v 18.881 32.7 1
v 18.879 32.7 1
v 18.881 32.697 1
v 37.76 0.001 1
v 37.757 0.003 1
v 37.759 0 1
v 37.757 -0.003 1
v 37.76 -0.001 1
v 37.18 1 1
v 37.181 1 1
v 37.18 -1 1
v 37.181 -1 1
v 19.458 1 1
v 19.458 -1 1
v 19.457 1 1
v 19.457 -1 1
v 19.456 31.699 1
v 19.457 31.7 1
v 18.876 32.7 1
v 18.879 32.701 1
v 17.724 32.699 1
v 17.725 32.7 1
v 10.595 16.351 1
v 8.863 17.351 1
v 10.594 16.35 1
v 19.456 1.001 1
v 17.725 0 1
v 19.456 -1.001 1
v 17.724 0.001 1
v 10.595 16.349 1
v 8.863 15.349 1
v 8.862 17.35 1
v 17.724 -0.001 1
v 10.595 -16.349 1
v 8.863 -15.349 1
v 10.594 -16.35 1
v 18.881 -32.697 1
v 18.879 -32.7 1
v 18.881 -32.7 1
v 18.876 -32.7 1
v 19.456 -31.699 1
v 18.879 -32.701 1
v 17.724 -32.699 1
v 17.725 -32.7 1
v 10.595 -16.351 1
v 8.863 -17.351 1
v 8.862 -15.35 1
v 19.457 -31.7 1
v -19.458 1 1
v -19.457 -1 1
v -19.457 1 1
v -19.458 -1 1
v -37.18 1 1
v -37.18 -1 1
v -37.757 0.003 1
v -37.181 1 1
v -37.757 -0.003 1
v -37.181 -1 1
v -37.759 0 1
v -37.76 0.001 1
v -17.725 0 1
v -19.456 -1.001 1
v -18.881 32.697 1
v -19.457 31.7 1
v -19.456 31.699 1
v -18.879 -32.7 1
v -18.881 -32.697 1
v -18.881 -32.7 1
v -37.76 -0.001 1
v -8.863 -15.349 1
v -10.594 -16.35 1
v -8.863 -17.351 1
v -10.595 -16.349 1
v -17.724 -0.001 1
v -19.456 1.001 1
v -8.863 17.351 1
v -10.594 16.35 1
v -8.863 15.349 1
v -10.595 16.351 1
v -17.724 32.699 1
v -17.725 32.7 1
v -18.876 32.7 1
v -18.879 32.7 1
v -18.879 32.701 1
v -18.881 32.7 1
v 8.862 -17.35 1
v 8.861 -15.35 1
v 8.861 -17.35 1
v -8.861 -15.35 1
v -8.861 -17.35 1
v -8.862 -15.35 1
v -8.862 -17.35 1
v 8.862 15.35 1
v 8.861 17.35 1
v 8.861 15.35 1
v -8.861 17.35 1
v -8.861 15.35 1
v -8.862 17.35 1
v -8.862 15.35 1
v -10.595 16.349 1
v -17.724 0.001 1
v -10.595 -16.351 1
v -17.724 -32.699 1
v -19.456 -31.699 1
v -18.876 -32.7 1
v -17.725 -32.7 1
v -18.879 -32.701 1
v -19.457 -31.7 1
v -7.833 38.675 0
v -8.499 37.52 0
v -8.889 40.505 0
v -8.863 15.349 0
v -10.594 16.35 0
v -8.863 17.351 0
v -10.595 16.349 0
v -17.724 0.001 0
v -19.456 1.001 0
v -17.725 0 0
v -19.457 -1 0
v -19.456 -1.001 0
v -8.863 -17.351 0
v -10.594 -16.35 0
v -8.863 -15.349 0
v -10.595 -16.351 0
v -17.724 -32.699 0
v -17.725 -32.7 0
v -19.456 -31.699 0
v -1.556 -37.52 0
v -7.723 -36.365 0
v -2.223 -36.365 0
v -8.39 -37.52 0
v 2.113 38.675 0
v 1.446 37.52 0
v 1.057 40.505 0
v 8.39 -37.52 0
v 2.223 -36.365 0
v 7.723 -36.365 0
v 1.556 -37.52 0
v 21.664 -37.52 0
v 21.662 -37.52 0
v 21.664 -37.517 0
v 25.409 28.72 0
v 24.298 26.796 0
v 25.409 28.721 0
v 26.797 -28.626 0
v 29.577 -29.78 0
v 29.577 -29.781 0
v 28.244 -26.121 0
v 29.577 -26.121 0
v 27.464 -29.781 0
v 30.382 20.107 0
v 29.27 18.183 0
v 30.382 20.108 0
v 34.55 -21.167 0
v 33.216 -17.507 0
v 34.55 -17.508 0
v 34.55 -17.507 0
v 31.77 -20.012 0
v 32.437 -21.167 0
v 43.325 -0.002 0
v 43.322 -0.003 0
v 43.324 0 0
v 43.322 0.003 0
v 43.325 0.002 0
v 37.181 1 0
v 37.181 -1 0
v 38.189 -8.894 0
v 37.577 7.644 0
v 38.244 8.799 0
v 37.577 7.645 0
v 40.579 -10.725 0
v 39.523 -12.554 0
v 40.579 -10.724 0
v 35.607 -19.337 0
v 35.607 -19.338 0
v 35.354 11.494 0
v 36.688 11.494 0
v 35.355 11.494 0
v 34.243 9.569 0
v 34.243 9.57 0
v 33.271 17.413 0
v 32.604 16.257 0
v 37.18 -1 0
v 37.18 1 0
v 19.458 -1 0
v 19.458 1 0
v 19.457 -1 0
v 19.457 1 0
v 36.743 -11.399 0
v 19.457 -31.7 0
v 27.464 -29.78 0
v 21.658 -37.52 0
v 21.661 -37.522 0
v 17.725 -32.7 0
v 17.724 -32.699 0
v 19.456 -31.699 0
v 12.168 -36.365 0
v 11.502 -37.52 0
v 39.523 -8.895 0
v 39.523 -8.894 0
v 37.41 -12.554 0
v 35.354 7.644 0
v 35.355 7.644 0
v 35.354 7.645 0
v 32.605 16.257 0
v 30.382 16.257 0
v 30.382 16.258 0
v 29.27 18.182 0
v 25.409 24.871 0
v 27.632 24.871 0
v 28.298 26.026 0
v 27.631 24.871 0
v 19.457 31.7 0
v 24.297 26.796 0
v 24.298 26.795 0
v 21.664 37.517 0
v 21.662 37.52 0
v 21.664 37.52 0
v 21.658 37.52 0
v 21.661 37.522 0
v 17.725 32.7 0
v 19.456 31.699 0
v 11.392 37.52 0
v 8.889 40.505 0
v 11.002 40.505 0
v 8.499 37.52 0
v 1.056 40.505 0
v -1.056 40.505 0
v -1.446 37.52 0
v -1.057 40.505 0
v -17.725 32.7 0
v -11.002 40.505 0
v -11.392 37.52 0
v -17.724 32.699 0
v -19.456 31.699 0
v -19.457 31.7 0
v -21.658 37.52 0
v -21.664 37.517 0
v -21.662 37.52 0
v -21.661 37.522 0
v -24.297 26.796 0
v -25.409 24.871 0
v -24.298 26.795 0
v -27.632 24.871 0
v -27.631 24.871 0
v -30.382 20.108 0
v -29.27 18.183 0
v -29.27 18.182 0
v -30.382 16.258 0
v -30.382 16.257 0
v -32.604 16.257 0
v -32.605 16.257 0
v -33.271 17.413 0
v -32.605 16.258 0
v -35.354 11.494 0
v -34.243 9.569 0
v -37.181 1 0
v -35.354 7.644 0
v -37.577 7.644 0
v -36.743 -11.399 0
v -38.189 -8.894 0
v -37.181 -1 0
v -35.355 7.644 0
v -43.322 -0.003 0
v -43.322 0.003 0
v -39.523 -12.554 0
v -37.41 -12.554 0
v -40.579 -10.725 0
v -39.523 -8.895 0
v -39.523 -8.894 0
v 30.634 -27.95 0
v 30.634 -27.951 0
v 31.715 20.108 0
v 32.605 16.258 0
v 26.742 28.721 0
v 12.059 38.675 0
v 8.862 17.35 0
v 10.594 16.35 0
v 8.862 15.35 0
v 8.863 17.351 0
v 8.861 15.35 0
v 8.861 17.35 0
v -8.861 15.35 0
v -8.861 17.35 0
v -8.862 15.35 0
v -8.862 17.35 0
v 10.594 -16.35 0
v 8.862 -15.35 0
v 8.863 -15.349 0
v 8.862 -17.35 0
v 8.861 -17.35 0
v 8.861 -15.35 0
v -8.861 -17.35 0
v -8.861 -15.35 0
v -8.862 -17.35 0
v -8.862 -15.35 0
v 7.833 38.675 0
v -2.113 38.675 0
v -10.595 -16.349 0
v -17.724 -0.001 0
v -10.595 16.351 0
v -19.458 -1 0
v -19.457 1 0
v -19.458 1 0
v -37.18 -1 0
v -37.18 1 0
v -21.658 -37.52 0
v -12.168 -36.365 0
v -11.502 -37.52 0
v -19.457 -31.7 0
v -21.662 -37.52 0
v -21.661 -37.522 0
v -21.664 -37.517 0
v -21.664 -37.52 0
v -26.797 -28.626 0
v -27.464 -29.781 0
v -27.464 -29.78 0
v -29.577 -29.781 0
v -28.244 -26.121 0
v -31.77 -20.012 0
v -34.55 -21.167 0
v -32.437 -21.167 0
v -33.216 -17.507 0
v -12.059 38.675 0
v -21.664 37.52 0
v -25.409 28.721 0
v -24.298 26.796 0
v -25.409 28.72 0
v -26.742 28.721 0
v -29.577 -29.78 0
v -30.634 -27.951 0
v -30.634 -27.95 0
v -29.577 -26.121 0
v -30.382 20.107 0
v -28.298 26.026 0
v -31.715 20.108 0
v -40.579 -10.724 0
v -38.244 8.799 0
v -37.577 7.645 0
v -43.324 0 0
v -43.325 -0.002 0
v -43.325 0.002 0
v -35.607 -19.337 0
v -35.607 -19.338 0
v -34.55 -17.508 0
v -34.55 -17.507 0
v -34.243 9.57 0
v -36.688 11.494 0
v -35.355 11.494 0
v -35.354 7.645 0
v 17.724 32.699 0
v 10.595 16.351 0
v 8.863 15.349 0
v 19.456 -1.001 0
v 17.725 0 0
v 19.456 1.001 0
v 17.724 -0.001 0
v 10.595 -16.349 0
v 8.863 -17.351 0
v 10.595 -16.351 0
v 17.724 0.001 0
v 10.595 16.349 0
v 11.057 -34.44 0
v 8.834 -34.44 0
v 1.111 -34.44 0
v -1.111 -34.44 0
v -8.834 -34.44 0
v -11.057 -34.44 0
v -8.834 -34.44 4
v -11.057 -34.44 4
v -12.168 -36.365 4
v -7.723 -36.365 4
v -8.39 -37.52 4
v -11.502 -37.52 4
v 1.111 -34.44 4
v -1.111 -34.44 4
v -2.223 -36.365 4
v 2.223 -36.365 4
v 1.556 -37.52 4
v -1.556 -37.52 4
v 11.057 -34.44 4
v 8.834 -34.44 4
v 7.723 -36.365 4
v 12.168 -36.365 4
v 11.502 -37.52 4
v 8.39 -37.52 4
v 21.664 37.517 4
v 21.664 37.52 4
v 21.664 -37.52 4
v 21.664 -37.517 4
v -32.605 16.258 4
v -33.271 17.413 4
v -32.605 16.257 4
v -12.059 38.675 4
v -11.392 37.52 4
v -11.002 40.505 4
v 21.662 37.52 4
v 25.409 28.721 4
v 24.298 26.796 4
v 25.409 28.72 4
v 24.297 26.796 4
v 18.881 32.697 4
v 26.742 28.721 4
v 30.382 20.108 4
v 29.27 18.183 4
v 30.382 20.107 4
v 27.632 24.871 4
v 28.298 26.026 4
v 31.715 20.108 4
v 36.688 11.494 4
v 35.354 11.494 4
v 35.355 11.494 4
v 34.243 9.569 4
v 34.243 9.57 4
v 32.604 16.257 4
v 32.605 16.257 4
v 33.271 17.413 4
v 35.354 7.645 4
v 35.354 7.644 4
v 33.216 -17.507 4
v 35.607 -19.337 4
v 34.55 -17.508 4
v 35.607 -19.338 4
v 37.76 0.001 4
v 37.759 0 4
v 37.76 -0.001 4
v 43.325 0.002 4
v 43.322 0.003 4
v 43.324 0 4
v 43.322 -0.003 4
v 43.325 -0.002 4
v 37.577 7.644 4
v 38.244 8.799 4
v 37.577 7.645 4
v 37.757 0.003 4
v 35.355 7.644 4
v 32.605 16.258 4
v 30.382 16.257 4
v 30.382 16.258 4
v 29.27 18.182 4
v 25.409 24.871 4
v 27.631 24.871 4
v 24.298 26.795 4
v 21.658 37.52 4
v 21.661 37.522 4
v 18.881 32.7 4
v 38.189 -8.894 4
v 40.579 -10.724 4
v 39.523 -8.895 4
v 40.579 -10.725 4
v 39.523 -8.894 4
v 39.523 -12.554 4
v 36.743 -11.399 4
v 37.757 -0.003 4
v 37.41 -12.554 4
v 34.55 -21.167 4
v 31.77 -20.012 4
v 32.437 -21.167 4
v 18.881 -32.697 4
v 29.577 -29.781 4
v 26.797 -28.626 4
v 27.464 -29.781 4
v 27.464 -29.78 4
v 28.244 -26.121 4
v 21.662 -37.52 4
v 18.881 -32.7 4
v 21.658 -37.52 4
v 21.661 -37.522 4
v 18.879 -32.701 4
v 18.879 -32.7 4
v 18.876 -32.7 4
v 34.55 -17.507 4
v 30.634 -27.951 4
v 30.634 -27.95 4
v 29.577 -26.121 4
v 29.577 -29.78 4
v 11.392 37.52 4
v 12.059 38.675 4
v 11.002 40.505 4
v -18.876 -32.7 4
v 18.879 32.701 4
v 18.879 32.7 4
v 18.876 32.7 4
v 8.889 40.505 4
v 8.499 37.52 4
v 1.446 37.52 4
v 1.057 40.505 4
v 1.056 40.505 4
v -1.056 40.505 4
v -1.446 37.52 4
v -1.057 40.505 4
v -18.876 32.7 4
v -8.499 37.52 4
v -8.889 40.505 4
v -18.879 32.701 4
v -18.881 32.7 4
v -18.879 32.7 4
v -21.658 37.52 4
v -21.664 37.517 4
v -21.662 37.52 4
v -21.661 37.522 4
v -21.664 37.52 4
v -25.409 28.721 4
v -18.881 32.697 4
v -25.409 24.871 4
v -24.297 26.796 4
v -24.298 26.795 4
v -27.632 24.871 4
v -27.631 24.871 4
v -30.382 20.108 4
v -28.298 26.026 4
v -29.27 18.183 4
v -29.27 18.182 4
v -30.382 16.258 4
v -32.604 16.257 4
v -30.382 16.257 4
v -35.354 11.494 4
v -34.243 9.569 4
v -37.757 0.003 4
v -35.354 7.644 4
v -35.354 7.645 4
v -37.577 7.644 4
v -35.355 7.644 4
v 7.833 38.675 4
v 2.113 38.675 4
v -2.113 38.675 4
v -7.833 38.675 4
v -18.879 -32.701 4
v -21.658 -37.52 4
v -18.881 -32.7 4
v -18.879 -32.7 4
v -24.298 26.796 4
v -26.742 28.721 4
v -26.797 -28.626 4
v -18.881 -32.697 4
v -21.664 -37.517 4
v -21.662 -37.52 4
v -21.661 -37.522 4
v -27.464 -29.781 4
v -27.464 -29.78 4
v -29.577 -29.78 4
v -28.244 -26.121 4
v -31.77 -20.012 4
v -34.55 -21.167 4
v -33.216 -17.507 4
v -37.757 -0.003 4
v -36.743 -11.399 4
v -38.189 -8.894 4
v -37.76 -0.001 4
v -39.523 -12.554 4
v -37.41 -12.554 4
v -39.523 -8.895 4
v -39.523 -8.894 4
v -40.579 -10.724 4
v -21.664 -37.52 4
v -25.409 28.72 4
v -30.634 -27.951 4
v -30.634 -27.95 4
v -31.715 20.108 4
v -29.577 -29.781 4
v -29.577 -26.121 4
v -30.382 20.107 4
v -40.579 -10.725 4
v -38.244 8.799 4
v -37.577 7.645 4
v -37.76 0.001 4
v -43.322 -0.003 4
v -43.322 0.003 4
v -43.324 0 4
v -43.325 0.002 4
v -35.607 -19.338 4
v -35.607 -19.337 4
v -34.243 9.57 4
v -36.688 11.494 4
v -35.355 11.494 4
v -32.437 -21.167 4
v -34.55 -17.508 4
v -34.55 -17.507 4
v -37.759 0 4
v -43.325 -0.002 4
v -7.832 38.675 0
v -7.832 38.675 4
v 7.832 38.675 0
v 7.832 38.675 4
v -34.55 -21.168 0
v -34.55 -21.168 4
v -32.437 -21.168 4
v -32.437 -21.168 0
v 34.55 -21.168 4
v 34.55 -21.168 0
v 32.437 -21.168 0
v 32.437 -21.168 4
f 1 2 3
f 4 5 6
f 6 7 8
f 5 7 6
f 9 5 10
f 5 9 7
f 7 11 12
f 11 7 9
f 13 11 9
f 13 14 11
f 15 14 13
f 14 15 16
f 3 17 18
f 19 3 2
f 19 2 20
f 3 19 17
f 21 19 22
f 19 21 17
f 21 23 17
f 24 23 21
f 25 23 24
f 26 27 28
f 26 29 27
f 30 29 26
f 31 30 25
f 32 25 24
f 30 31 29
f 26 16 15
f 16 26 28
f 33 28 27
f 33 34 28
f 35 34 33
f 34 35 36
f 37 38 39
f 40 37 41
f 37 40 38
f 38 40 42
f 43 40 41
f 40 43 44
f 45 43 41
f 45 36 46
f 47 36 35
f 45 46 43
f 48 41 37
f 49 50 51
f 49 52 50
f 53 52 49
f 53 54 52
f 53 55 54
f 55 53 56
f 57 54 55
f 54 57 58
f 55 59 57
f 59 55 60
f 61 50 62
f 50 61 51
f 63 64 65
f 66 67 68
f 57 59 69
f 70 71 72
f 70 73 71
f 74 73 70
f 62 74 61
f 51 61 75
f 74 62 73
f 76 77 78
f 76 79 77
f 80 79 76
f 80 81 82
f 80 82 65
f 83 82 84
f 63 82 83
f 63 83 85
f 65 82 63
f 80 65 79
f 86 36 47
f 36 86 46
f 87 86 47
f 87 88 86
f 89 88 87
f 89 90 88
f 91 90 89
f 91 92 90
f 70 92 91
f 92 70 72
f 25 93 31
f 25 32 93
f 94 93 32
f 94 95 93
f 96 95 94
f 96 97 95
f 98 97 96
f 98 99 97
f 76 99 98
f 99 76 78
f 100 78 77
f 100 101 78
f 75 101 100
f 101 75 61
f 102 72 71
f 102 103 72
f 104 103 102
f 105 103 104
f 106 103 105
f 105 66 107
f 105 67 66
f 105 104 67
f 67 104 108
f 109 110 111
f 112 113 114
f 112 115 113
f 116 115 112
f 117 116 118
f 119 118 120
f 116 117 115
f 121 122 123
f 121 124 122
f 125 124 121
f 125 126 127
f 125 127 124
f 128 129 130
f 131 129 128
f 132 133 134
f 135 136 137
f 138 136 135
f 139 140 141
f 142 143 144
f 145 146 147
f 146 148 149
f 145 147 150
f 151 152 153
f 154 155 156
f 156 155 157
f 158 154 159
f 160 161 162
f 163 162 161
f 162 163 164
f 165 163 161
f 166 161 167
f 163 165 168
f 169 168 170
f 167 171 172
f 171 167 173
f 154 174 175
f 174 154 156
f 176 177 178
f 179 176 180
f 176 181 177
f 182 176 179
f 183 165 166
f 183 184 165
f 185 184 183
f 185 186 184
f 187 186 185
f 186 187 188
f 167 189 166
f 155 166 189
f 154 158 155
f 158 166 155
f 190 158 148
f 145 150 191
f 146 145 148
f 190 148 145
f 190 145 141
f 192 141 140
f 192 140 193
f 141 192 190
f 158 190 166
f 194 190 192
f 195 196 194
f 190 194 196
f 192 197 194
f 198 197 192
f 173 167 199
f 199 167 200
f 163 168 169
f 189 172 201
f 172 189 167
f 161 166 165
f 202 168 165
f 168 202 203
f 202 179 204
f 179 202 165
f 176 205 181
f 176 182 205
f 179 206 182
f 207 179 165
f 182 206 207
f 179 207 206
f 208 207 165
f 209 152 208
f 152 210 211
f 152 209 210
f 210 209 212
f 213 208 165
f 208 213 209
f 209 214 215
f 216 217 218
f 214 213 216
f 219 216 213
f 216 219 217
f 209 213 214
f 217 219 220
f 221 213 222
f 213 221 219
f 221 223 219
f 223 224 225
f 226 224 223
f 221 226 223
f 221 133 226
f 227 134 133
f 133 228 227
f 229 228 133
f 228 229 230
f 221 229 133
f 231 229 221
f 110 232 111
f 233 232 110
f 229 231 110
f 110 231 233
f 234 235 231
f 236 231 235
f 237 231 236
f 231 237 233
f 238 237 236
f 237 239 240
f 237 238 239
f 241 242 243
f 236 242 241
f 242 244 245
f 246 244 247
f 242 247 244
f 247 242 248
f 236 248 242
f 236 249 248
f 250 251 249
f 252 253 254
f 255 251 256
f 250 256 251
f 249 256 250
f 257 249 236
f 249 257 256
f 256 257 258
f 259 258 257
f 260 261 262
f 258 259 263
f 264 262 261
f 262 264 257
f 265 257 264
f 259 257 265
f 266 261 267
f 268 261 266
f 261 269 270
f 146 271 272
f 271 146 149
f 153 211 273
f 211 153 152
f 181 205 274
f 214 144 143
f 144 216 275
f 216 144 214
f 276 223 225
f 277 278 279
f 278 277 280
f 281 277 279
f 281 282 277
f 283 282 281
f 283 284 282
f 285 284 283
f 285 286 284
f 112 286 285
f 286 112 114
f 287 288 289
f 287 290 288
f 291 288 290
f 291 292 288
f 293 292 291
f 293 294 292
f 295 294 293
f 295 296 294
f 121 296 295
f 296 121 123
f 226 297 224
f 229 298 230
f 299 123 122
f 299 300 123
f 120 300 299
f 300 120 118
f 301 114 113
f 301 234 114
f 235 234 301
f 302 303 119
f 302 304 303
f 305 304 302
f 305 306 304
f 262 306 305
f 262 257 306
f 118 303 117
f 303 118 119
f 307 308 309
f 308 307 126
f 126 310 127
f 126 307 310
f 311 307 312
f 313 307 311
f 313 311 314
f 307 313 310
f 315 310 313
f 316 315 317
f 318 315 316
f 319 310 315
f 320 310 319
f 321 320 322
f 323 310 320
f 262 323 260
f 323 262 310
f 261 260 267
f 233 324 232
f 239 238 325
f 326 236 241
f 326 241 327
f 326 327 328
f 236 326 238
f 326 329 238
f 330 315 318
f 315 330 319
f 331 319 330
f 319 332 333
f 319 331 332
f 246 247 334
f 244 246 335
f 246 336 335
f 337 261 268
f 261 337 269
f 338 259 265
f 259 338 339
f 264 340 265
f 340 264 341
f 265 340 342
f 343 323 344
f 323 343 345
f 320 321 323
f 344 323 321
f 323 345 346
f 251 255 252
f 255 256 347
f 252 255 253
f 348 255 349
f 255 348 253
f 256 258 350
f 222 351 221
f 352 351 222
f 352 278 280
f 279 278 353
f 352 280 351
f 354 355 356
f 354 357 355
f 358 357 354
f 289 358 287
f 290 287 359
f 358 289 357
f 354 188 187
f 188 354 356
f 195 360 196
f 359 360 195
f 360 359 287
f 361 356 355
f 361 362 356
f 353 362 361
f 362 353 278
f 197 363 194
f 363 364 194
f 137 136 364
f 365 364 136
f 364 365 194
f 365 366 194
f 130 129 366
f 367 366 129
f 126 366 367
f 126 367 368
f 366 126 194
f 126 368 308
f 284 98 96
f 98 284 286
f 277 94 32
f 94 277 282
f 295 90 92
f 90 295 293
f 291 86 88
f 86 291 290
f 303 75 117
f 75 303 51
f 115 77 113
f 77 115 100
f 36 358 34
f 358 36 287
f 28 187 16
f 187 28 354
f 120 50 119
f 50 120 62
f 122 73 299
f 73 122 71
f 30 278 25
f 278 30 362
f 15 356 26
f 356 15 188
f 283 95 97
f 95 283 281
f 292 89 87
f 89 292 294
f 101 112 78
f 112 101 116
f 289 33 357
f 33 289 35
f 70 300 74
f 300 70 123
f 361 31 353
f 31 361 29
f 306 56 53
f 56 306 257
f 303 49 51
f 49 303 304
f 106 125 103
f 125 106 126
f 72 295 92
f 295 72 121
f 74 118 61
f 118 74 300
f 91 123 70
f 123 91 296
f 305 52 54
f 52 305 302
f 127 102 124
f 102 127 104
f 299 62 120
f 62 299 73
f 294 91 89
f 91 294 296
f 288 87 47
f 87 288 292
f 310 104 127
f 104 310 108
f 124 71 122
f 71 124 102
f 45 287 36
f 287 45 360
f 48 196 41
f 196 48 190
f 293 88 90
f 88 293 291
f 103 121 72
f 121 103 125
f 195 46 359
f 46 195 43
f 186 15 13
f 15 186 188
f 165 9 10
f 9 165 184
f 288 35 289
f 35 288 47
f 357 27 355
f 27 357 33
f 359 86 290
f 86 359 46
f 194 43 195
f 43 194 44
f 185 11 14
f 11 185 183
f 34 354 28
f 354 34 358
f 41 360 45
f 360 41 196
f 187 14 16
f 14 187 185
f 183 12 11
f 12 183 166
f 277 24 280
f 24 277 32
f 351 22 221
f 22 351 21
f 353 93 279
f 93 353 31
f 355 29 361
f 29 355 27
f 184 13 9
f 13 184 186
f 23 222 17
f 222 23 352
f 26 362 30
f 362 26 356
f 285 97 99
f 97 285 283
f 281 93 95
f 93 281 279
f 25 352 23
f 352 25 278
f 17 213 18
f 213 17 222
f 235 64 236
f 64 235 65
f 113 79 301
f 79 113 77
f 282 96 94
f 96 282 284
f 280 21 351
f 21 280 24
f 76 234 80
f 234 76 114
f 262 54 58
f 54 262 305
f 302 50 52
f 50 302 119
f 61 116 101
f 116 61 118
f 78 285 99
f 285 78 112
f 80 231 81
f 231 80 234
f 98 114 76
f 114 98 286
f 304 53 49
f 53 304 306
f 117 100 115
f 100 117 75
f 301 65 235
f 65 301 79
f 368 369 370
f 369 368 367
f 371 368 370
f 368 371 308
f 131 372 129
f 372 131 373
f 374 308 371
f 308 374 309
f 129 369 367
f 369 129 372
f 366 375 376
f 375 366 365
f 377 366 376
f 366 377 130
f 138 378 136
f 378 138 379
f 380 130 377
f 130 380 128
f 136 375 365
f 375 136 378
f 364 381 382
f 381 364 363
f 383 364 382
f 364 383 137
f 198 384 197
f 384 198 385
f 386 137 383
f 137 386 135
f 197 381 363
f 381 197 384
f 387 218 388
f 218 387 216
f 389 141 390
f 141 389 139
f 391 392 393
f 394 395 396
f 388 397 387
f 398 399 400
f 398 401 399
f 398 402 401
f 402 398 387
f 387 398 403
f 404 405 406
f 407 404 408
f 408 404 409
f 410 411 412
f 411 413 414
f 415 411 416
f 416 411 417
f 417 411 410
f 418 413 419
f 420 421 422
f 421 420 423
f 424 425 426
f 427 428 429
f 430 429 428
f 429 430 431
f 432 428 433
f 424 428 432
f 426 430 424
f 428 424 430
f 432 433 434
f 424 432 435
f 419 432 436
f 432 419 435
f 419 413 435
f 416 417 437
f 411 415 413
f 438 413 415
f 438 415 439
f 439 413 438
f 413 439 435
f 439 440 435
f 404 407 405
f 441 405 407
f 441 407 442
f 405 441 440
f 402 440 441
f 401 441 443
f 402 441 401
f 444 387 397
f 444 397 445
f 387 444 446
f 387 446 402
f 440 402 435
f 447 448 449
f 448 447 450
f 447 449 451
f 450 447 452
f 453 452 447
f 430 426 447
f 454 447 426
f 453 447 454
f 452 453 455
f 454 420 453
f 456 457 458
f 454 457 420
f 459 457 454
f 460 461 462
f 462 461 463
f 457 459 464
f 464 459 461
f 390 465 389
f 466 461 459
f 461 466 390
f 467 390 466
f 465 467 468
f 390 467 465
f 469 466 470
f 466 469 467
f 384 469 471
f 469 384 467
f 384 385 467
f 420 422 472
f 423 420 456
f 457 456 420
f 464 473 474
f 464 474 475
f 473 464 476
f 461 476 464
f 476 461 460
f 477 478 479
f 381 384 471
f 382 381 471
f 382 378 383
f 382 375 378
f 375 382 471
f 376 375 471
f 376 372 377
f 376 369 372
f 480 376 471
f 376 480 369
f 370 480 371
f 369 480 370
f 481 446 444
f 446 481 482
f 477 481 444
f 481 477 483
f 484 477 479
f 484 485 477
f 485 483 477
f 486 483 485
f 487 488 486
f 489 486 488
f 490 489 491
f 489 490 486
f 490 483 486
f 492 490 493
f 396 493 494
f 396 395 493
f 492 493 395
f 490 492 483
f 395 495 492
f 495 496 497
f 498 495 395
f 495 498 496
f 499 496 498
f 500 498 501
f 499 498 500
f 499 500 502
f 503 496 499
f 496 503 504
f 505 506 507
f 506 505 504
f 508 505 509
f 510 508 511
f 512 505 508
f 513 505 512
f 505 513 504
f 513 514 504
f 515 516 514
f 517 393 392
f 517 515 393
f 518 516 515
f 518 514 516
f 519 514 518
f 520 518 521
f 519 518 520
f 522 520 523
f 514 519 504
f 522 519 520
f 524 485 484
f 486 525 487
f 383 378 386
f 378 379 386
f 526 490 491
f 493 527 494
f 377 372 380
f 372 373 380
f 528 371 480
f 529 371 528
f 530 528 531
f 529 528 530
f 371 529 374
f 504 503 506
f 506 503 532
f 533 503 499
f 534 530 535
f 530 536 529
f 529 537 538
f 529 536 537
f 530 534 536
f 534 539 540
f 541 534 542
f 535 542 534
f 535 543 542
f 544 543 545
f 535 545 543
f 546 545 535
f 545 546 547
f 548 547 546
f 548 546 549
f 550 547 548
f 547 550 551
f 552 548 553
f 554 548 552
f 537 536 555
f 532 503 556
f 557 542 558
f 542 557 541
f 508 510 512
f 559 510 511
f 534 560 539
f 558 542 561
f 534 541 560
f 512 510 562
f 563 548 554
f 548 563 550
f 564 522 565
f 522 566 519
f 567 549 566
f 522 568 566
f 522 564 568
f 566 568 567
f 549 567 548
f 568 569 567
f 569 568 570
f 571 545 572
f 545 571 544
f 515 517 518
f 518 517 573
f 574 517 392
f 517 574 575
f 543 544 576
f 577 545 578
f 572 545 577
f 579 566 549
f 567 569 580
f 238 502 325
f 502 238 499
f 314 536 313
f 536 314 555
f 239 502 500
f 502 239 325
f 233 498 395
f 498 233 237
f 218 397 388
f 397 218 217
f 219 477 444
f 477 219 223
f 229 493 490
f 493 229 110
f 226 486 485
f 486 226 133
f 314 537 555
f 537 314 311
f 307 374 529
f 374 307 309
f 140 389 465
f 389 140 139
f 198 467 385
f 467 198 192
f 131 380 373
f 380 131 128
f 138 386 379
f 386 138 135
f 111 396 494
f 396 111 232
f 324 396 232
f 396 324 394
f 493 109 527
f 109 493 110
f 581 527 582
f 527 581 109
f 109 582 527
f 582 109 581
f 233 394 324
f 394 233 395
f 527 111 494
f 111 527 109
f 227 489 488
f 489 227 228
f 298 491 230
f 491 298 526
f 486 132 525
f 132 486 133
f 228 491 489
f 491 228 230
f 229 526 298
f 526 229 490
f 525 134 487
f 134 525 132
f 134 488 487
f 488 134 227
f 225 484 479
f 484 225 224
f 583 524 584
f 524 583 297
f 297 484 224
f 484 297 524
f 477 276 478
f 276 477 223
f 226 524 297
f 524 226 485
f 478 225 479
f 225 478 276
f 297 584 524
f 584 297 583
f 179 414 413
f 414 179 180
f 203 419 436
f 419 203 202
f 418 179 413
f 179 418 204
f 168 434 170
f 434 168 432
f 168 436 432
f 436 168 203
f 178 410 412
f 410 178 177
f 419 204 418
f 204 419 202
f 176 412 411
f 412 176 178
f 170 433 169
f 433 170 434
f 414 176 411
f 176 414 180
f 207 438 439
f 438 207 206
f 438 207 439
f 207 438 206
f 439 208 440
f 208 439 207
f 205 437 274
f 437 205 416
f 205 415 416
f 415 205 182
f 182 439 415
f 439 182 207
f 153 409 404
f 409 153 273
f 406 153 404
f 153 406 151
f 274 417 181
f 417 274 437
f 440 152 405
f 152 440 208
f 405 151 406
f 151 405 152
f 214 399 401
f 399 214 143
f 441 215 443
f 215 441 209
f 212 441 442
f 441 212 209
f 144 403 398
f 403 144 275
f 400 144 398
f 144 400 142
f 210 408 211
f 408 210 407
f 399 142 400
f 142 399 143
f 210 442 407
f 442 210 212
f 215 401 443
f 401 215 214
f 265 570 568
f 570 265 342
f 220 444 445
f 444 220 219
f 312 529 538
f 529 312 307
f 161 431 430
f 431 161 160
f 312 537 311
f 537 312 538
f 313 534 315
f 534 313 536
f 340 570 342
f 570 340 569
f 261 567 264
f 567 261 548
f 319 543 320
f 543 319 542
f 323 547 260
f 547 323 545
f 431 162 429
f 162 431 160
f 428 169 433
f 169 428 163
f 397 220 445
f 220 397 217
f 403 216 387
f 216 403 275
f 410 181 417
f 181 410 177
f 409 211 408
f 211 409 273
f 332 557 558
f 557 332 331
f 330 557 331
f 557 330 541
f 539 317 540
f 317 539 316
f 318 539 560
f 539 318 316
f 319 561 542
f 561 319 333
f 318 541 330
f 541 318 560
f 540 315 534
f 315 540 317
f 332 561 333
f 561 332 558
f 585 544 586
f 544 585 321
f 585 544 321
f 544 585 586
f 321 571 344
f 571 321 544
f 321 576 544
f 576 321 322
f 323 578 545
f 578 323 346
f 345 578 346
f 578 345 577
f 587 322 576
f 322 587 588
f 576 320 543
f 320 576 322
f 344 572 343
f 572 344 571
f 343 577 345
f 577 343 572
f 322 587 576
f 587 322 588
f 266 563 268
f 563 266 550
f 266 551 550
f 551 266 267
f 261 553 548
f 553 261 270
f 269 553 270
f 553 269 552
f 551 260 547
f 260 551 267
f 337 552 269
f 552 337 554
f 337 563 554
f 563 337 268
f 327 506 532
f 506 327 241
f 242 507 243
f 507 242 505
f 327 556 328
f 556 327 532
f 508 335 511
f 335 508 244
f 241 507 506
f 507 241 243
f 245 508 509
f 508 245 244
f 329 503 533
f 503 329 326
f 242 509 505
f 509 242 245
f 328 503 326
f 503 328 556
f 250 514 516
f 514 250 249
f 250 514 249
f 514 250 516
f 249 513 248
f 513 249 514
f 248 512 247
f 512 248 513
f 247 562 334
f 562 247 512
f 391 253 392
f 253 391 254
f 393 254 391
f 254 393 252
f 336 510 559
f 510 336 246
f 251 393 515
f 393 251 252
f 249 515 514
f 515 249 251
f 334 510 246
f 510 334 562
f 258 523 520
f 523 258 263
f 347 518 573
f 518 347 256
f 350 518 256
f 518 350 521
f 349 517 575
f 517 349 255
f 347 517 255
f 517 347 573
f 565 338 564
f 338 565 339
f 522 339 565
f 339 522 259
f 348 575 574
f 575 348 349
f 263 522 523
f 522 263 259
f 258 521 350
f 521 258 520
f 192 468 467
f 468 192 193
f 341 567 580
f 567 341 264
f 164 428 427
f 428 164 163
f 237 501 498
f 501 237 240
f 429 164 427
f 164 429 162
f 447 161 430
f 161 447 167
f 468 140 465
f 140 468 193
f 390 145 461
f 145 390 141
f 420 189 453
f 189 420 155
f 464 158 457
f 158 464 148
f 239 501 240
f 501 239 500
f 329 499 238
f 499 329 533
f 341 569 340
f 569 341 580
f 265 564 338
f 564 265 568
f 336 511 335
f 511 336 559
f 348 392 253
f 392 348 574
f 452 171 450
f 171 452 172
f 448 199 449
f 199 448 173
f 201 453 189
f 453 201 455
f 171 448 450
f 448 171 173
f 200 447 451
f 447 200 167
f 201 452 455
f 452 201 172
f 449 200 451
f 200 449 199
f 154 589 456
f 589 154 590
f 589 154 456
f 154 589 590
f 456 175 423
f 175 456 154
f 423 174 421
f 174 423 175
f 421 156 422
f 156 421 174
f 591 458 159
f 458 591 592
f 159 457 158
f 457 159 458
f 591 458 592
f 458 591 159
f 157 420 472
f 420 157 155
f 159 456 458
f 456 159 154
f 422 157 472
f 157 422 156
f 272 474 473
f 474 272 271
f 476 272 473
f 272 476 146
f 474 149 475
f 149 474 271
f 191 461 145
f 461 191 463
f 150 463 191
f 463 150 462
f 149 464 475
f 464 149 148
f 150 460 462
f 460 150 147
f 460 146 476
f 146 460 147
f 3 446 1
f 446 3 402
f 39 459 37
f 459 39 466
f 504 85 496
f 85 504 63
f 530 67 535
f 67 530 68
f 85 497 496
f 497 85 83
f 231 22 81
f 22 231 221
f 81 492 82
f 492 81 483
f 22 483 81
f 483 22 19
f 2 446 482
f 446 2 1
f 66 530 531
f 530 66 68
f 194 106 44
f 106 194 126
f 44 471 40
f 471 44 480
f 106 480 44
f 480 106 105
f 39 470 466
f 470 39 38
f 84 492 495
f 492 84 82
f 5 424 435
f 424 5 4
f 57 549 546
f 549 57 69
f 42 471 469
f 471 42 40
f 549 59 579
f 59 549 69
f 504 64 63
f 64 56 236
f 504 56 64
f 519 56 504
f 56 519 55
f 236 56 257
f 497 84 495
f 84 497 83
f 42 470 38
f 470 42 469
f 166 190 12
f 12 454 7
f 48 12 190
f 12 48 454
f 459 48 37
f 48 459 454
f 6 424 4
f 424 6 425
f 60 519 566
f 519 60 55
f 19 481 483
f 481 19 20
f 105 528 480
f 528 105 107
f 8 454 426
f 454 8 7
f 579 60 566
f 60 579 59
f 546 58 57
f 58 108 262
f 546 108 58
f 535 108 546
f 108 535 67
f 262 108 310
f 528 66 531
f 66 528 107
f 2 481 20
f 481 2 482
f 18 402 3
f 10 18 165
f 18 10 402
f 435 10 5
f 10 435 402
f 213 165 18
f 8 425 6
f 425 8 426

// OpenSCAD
/* [MAIN HEXAGON] */

// What is the desired distance between two parallel edges of the main hex, so that the drawer would fit ?
HEXAGON_HEIGHT = 65.4;

// What is depth of the main hex, so that the drawer would fit? (distance from the front edge to the beginning of the back wall)
HEXAGON_DEPTH = 3;

// What is the desired thickness of the main hex, so that it is sturdy enough?
HEXAGON_WALL_THICKNESS = 4.82;

/* [BACK WALL] */

// What is the type of the back wall?
BACK_WALL_TYPE = 2; // [0:None,1:Solid,2:Openwork]

// What is the depth of the back wall? (it will be added to the total depth)
BACK_WALL_DEPTH = 1; // [0:10]

/* [CONNECTORS] */

// What is the desired distance of two parallel edges of the connector hex? 
CONNECTOR_HEIGHT = 3.85;

// What is the desired distance between the central and side connectors
CONNECTOR_DISTANCE = 5.5;

// What fraction of the connector should be "hidden" within the main hex body.
CONNECTOR_OFFSET  = 0.8; // [0.6:0.1:0.9]

// Tolerance reduces the positive connector size, so it is more likely it fits.
CONNECTOR_TOLERANCE = 0.19;    // [0.0:0.01:4.0]

/* [HIDDEN] */
/*
    Print the part !
    With the defaults, it is most likely compatibile with the Hive system 
*/
hive_hexagon(
    HEXAGON_HEIGHT, HEXAGON_DEPTH, HEXAGON_WALL_THICKNESS, 
    BACK_WALL_TYPE, BACK_WALL_DEPTH, 
    CONNECTOR_HEIGHT, CONNECTOR_DISTANCE, CONNECTOR_OFFSET, CONNECTOR_TOLERANCE
);


/*
    Generates the hive_hex.
*/
module hive_hexagon(
    hexagon_height, hexagon_depth, hexagon_wall_thickness, 
    back_wall_type, back_wall_depth,    
    connector_height, connector_distance, connector_offset, connector_tolerance){
    base_total_height = total_height(hexagon_height, hexagon_wall_thickness);
    base_total_depth = hexagon_depth + back_wall_depth;
                    
    echo(str("Total base height:", base_total_height));                    
    echo(str("Total base depth:", base_total_depth));                    
    
    union(){
        back_wall(hexagon_height, back_wall_type, back_wall_depth);
        
        translate([0,0,base_total_depth/2]) 
        difference(){
            hexagon_with_connectors(base_total_height, connector_height, connector_distance, connector_offset, connector_tolerance, base_total_depth);
            hexagon(hexagon_height, base_total_depth*2);
        };
    }
}

/*
    Generates hexagon of the given size (distance between its parallel edges)
    This version works with my brain a bit better than hexagon in shapes.scad from https://github.com/openscad/MCAD    
*/
module hexagon(size, depth) {
  angle_step = 60;
  // Iterate 3 times    
  for (n = [0:1:2]){
      rotate([0,0, n*angle_step]) 
      cube([edge_length(size), size, depth], true);
  }
}


/*
    Generates the hive_hex's back wall.

    Back wall of the container - optional
    type:
    0 - none
    1 - solid
    2 - openwork (ajour)
*/
module back_wall(hexagon_height, type, depth){
    if (type==0) {
        // no wall
    }
    
    if (type==1) {
        // solid wall
        translate([0,0,depth/2]) 
        hexagon(hexagon_height, depth);          
    }
    
    if (type==2) {
        // ajour
        color("red");
        edge_thickness = 4;
        hollow_hexagon_height = (hexagon_height + edge_thickness) / 2;
        
        translate([0,0,depth/2])         
        intersection(){
            union(){
                
                hollow_hexagon(hollow_hexagon_height, edge_thickness, depth);
                for (r = [-150, -90, -30, 30, 90, 150]){
                    rotate([0,0,r]) 
                    translate([hollow_hexagon_height - edge_thickness/2, 0, 0])
                    rotate([0,0,-r]) 
                    hollow_hexagon(hollow_hexagon_height, 4, depth);
                }            
            };
            hexagon(hexagon_height+depth/2, depth*2);
        }
    }    
}


module connectors_set(cube_width, cube_height, cube_depth, connector_size, connector_distance, position, offset_ratio, tolerance){
    /*
    This module draws a set of connectors (a row of connectors)
    */
    //x_translation = 0.22*cube_width; 
    x_translation = connector_distance + vertex_to_vertex_distance(connector_size);
    echo(x_translation);
    y_translation = position*(cube_height/2 + connector_size/2 - connector_size*offset_ratio);      

    for (n = [-1, 0, 1]) {
        translate([x_translation*n,y_translation,0]) 
        hexagon(connector_size-tolerance, cube_depth*1.0);
    }        
}

module cube_with_connectors(dimmensions, connector_size, connector_distance, connector_offset, connector_tolerance) {
    hex_side_width = dimmensions[0];
    hex_height = dimmensions[1];
    hive_depth = dimmensions[2]; 
    
    negative_position = -1; 
    positive_position = 1;  
    
    echo (str("Connector tolerance: ",connector_tolerance, "resulted in connector sizes", "\nNEGATIVE: ", connector_size, "\nPOSITIVE:", connector_size-connector_tolerance,"\n"));
        
    union(){
        difference(){
            cube(dimmensions, true);
            connectors_set(
                hex_side_width, hex_height, hive_depth*2, 
                connector_size, connector_distance, 
                negative_position, connector_offset, 0);
        }
        connectors_set(
            hex_side_width, hex_height, hive_depth, 
            connector_size, connector_distance,
            positive_position, 1 - connector_offset, connector_tolerance);
    }
}


/*
    Modified version of the hexagon.
*/
module hexagon_with_connectors(size, connector_size, connector_distance, connector_offset, connector_tolerance, height) {
  angle_step = 60*2;   // Every second box

  // Iterate 3 times
  for (n = [0:1:2]){
      rotate([0,0, n*angle_step]) 
      cube_with_connectors([edge_length(size), size, height], connector_size, connector_distance, connector_offset, connector_tolerance);
  }
}

/*
    Calculates total height (edge to edge) based on inner height and wall thickness
*/
function total_height(inner_height, wall_thickness) = inner_height + wall_thickness*2;

/*
    Calculates the vertex to vertex distance
*/
function vertex_to_vertex_distance(edge_to_edge_distance) = edge_to_edge_distance*1.1547;

/*
    Calculates the hexagon edge length
*/
function edge_length(size) = size*0.5774; 


module hollow_hexagon(height, wall_thickness, depth){
    difference(){
        hexagon(height, depth);
        hexagon(height-wall_thickness, depth*2);
    }       
}
